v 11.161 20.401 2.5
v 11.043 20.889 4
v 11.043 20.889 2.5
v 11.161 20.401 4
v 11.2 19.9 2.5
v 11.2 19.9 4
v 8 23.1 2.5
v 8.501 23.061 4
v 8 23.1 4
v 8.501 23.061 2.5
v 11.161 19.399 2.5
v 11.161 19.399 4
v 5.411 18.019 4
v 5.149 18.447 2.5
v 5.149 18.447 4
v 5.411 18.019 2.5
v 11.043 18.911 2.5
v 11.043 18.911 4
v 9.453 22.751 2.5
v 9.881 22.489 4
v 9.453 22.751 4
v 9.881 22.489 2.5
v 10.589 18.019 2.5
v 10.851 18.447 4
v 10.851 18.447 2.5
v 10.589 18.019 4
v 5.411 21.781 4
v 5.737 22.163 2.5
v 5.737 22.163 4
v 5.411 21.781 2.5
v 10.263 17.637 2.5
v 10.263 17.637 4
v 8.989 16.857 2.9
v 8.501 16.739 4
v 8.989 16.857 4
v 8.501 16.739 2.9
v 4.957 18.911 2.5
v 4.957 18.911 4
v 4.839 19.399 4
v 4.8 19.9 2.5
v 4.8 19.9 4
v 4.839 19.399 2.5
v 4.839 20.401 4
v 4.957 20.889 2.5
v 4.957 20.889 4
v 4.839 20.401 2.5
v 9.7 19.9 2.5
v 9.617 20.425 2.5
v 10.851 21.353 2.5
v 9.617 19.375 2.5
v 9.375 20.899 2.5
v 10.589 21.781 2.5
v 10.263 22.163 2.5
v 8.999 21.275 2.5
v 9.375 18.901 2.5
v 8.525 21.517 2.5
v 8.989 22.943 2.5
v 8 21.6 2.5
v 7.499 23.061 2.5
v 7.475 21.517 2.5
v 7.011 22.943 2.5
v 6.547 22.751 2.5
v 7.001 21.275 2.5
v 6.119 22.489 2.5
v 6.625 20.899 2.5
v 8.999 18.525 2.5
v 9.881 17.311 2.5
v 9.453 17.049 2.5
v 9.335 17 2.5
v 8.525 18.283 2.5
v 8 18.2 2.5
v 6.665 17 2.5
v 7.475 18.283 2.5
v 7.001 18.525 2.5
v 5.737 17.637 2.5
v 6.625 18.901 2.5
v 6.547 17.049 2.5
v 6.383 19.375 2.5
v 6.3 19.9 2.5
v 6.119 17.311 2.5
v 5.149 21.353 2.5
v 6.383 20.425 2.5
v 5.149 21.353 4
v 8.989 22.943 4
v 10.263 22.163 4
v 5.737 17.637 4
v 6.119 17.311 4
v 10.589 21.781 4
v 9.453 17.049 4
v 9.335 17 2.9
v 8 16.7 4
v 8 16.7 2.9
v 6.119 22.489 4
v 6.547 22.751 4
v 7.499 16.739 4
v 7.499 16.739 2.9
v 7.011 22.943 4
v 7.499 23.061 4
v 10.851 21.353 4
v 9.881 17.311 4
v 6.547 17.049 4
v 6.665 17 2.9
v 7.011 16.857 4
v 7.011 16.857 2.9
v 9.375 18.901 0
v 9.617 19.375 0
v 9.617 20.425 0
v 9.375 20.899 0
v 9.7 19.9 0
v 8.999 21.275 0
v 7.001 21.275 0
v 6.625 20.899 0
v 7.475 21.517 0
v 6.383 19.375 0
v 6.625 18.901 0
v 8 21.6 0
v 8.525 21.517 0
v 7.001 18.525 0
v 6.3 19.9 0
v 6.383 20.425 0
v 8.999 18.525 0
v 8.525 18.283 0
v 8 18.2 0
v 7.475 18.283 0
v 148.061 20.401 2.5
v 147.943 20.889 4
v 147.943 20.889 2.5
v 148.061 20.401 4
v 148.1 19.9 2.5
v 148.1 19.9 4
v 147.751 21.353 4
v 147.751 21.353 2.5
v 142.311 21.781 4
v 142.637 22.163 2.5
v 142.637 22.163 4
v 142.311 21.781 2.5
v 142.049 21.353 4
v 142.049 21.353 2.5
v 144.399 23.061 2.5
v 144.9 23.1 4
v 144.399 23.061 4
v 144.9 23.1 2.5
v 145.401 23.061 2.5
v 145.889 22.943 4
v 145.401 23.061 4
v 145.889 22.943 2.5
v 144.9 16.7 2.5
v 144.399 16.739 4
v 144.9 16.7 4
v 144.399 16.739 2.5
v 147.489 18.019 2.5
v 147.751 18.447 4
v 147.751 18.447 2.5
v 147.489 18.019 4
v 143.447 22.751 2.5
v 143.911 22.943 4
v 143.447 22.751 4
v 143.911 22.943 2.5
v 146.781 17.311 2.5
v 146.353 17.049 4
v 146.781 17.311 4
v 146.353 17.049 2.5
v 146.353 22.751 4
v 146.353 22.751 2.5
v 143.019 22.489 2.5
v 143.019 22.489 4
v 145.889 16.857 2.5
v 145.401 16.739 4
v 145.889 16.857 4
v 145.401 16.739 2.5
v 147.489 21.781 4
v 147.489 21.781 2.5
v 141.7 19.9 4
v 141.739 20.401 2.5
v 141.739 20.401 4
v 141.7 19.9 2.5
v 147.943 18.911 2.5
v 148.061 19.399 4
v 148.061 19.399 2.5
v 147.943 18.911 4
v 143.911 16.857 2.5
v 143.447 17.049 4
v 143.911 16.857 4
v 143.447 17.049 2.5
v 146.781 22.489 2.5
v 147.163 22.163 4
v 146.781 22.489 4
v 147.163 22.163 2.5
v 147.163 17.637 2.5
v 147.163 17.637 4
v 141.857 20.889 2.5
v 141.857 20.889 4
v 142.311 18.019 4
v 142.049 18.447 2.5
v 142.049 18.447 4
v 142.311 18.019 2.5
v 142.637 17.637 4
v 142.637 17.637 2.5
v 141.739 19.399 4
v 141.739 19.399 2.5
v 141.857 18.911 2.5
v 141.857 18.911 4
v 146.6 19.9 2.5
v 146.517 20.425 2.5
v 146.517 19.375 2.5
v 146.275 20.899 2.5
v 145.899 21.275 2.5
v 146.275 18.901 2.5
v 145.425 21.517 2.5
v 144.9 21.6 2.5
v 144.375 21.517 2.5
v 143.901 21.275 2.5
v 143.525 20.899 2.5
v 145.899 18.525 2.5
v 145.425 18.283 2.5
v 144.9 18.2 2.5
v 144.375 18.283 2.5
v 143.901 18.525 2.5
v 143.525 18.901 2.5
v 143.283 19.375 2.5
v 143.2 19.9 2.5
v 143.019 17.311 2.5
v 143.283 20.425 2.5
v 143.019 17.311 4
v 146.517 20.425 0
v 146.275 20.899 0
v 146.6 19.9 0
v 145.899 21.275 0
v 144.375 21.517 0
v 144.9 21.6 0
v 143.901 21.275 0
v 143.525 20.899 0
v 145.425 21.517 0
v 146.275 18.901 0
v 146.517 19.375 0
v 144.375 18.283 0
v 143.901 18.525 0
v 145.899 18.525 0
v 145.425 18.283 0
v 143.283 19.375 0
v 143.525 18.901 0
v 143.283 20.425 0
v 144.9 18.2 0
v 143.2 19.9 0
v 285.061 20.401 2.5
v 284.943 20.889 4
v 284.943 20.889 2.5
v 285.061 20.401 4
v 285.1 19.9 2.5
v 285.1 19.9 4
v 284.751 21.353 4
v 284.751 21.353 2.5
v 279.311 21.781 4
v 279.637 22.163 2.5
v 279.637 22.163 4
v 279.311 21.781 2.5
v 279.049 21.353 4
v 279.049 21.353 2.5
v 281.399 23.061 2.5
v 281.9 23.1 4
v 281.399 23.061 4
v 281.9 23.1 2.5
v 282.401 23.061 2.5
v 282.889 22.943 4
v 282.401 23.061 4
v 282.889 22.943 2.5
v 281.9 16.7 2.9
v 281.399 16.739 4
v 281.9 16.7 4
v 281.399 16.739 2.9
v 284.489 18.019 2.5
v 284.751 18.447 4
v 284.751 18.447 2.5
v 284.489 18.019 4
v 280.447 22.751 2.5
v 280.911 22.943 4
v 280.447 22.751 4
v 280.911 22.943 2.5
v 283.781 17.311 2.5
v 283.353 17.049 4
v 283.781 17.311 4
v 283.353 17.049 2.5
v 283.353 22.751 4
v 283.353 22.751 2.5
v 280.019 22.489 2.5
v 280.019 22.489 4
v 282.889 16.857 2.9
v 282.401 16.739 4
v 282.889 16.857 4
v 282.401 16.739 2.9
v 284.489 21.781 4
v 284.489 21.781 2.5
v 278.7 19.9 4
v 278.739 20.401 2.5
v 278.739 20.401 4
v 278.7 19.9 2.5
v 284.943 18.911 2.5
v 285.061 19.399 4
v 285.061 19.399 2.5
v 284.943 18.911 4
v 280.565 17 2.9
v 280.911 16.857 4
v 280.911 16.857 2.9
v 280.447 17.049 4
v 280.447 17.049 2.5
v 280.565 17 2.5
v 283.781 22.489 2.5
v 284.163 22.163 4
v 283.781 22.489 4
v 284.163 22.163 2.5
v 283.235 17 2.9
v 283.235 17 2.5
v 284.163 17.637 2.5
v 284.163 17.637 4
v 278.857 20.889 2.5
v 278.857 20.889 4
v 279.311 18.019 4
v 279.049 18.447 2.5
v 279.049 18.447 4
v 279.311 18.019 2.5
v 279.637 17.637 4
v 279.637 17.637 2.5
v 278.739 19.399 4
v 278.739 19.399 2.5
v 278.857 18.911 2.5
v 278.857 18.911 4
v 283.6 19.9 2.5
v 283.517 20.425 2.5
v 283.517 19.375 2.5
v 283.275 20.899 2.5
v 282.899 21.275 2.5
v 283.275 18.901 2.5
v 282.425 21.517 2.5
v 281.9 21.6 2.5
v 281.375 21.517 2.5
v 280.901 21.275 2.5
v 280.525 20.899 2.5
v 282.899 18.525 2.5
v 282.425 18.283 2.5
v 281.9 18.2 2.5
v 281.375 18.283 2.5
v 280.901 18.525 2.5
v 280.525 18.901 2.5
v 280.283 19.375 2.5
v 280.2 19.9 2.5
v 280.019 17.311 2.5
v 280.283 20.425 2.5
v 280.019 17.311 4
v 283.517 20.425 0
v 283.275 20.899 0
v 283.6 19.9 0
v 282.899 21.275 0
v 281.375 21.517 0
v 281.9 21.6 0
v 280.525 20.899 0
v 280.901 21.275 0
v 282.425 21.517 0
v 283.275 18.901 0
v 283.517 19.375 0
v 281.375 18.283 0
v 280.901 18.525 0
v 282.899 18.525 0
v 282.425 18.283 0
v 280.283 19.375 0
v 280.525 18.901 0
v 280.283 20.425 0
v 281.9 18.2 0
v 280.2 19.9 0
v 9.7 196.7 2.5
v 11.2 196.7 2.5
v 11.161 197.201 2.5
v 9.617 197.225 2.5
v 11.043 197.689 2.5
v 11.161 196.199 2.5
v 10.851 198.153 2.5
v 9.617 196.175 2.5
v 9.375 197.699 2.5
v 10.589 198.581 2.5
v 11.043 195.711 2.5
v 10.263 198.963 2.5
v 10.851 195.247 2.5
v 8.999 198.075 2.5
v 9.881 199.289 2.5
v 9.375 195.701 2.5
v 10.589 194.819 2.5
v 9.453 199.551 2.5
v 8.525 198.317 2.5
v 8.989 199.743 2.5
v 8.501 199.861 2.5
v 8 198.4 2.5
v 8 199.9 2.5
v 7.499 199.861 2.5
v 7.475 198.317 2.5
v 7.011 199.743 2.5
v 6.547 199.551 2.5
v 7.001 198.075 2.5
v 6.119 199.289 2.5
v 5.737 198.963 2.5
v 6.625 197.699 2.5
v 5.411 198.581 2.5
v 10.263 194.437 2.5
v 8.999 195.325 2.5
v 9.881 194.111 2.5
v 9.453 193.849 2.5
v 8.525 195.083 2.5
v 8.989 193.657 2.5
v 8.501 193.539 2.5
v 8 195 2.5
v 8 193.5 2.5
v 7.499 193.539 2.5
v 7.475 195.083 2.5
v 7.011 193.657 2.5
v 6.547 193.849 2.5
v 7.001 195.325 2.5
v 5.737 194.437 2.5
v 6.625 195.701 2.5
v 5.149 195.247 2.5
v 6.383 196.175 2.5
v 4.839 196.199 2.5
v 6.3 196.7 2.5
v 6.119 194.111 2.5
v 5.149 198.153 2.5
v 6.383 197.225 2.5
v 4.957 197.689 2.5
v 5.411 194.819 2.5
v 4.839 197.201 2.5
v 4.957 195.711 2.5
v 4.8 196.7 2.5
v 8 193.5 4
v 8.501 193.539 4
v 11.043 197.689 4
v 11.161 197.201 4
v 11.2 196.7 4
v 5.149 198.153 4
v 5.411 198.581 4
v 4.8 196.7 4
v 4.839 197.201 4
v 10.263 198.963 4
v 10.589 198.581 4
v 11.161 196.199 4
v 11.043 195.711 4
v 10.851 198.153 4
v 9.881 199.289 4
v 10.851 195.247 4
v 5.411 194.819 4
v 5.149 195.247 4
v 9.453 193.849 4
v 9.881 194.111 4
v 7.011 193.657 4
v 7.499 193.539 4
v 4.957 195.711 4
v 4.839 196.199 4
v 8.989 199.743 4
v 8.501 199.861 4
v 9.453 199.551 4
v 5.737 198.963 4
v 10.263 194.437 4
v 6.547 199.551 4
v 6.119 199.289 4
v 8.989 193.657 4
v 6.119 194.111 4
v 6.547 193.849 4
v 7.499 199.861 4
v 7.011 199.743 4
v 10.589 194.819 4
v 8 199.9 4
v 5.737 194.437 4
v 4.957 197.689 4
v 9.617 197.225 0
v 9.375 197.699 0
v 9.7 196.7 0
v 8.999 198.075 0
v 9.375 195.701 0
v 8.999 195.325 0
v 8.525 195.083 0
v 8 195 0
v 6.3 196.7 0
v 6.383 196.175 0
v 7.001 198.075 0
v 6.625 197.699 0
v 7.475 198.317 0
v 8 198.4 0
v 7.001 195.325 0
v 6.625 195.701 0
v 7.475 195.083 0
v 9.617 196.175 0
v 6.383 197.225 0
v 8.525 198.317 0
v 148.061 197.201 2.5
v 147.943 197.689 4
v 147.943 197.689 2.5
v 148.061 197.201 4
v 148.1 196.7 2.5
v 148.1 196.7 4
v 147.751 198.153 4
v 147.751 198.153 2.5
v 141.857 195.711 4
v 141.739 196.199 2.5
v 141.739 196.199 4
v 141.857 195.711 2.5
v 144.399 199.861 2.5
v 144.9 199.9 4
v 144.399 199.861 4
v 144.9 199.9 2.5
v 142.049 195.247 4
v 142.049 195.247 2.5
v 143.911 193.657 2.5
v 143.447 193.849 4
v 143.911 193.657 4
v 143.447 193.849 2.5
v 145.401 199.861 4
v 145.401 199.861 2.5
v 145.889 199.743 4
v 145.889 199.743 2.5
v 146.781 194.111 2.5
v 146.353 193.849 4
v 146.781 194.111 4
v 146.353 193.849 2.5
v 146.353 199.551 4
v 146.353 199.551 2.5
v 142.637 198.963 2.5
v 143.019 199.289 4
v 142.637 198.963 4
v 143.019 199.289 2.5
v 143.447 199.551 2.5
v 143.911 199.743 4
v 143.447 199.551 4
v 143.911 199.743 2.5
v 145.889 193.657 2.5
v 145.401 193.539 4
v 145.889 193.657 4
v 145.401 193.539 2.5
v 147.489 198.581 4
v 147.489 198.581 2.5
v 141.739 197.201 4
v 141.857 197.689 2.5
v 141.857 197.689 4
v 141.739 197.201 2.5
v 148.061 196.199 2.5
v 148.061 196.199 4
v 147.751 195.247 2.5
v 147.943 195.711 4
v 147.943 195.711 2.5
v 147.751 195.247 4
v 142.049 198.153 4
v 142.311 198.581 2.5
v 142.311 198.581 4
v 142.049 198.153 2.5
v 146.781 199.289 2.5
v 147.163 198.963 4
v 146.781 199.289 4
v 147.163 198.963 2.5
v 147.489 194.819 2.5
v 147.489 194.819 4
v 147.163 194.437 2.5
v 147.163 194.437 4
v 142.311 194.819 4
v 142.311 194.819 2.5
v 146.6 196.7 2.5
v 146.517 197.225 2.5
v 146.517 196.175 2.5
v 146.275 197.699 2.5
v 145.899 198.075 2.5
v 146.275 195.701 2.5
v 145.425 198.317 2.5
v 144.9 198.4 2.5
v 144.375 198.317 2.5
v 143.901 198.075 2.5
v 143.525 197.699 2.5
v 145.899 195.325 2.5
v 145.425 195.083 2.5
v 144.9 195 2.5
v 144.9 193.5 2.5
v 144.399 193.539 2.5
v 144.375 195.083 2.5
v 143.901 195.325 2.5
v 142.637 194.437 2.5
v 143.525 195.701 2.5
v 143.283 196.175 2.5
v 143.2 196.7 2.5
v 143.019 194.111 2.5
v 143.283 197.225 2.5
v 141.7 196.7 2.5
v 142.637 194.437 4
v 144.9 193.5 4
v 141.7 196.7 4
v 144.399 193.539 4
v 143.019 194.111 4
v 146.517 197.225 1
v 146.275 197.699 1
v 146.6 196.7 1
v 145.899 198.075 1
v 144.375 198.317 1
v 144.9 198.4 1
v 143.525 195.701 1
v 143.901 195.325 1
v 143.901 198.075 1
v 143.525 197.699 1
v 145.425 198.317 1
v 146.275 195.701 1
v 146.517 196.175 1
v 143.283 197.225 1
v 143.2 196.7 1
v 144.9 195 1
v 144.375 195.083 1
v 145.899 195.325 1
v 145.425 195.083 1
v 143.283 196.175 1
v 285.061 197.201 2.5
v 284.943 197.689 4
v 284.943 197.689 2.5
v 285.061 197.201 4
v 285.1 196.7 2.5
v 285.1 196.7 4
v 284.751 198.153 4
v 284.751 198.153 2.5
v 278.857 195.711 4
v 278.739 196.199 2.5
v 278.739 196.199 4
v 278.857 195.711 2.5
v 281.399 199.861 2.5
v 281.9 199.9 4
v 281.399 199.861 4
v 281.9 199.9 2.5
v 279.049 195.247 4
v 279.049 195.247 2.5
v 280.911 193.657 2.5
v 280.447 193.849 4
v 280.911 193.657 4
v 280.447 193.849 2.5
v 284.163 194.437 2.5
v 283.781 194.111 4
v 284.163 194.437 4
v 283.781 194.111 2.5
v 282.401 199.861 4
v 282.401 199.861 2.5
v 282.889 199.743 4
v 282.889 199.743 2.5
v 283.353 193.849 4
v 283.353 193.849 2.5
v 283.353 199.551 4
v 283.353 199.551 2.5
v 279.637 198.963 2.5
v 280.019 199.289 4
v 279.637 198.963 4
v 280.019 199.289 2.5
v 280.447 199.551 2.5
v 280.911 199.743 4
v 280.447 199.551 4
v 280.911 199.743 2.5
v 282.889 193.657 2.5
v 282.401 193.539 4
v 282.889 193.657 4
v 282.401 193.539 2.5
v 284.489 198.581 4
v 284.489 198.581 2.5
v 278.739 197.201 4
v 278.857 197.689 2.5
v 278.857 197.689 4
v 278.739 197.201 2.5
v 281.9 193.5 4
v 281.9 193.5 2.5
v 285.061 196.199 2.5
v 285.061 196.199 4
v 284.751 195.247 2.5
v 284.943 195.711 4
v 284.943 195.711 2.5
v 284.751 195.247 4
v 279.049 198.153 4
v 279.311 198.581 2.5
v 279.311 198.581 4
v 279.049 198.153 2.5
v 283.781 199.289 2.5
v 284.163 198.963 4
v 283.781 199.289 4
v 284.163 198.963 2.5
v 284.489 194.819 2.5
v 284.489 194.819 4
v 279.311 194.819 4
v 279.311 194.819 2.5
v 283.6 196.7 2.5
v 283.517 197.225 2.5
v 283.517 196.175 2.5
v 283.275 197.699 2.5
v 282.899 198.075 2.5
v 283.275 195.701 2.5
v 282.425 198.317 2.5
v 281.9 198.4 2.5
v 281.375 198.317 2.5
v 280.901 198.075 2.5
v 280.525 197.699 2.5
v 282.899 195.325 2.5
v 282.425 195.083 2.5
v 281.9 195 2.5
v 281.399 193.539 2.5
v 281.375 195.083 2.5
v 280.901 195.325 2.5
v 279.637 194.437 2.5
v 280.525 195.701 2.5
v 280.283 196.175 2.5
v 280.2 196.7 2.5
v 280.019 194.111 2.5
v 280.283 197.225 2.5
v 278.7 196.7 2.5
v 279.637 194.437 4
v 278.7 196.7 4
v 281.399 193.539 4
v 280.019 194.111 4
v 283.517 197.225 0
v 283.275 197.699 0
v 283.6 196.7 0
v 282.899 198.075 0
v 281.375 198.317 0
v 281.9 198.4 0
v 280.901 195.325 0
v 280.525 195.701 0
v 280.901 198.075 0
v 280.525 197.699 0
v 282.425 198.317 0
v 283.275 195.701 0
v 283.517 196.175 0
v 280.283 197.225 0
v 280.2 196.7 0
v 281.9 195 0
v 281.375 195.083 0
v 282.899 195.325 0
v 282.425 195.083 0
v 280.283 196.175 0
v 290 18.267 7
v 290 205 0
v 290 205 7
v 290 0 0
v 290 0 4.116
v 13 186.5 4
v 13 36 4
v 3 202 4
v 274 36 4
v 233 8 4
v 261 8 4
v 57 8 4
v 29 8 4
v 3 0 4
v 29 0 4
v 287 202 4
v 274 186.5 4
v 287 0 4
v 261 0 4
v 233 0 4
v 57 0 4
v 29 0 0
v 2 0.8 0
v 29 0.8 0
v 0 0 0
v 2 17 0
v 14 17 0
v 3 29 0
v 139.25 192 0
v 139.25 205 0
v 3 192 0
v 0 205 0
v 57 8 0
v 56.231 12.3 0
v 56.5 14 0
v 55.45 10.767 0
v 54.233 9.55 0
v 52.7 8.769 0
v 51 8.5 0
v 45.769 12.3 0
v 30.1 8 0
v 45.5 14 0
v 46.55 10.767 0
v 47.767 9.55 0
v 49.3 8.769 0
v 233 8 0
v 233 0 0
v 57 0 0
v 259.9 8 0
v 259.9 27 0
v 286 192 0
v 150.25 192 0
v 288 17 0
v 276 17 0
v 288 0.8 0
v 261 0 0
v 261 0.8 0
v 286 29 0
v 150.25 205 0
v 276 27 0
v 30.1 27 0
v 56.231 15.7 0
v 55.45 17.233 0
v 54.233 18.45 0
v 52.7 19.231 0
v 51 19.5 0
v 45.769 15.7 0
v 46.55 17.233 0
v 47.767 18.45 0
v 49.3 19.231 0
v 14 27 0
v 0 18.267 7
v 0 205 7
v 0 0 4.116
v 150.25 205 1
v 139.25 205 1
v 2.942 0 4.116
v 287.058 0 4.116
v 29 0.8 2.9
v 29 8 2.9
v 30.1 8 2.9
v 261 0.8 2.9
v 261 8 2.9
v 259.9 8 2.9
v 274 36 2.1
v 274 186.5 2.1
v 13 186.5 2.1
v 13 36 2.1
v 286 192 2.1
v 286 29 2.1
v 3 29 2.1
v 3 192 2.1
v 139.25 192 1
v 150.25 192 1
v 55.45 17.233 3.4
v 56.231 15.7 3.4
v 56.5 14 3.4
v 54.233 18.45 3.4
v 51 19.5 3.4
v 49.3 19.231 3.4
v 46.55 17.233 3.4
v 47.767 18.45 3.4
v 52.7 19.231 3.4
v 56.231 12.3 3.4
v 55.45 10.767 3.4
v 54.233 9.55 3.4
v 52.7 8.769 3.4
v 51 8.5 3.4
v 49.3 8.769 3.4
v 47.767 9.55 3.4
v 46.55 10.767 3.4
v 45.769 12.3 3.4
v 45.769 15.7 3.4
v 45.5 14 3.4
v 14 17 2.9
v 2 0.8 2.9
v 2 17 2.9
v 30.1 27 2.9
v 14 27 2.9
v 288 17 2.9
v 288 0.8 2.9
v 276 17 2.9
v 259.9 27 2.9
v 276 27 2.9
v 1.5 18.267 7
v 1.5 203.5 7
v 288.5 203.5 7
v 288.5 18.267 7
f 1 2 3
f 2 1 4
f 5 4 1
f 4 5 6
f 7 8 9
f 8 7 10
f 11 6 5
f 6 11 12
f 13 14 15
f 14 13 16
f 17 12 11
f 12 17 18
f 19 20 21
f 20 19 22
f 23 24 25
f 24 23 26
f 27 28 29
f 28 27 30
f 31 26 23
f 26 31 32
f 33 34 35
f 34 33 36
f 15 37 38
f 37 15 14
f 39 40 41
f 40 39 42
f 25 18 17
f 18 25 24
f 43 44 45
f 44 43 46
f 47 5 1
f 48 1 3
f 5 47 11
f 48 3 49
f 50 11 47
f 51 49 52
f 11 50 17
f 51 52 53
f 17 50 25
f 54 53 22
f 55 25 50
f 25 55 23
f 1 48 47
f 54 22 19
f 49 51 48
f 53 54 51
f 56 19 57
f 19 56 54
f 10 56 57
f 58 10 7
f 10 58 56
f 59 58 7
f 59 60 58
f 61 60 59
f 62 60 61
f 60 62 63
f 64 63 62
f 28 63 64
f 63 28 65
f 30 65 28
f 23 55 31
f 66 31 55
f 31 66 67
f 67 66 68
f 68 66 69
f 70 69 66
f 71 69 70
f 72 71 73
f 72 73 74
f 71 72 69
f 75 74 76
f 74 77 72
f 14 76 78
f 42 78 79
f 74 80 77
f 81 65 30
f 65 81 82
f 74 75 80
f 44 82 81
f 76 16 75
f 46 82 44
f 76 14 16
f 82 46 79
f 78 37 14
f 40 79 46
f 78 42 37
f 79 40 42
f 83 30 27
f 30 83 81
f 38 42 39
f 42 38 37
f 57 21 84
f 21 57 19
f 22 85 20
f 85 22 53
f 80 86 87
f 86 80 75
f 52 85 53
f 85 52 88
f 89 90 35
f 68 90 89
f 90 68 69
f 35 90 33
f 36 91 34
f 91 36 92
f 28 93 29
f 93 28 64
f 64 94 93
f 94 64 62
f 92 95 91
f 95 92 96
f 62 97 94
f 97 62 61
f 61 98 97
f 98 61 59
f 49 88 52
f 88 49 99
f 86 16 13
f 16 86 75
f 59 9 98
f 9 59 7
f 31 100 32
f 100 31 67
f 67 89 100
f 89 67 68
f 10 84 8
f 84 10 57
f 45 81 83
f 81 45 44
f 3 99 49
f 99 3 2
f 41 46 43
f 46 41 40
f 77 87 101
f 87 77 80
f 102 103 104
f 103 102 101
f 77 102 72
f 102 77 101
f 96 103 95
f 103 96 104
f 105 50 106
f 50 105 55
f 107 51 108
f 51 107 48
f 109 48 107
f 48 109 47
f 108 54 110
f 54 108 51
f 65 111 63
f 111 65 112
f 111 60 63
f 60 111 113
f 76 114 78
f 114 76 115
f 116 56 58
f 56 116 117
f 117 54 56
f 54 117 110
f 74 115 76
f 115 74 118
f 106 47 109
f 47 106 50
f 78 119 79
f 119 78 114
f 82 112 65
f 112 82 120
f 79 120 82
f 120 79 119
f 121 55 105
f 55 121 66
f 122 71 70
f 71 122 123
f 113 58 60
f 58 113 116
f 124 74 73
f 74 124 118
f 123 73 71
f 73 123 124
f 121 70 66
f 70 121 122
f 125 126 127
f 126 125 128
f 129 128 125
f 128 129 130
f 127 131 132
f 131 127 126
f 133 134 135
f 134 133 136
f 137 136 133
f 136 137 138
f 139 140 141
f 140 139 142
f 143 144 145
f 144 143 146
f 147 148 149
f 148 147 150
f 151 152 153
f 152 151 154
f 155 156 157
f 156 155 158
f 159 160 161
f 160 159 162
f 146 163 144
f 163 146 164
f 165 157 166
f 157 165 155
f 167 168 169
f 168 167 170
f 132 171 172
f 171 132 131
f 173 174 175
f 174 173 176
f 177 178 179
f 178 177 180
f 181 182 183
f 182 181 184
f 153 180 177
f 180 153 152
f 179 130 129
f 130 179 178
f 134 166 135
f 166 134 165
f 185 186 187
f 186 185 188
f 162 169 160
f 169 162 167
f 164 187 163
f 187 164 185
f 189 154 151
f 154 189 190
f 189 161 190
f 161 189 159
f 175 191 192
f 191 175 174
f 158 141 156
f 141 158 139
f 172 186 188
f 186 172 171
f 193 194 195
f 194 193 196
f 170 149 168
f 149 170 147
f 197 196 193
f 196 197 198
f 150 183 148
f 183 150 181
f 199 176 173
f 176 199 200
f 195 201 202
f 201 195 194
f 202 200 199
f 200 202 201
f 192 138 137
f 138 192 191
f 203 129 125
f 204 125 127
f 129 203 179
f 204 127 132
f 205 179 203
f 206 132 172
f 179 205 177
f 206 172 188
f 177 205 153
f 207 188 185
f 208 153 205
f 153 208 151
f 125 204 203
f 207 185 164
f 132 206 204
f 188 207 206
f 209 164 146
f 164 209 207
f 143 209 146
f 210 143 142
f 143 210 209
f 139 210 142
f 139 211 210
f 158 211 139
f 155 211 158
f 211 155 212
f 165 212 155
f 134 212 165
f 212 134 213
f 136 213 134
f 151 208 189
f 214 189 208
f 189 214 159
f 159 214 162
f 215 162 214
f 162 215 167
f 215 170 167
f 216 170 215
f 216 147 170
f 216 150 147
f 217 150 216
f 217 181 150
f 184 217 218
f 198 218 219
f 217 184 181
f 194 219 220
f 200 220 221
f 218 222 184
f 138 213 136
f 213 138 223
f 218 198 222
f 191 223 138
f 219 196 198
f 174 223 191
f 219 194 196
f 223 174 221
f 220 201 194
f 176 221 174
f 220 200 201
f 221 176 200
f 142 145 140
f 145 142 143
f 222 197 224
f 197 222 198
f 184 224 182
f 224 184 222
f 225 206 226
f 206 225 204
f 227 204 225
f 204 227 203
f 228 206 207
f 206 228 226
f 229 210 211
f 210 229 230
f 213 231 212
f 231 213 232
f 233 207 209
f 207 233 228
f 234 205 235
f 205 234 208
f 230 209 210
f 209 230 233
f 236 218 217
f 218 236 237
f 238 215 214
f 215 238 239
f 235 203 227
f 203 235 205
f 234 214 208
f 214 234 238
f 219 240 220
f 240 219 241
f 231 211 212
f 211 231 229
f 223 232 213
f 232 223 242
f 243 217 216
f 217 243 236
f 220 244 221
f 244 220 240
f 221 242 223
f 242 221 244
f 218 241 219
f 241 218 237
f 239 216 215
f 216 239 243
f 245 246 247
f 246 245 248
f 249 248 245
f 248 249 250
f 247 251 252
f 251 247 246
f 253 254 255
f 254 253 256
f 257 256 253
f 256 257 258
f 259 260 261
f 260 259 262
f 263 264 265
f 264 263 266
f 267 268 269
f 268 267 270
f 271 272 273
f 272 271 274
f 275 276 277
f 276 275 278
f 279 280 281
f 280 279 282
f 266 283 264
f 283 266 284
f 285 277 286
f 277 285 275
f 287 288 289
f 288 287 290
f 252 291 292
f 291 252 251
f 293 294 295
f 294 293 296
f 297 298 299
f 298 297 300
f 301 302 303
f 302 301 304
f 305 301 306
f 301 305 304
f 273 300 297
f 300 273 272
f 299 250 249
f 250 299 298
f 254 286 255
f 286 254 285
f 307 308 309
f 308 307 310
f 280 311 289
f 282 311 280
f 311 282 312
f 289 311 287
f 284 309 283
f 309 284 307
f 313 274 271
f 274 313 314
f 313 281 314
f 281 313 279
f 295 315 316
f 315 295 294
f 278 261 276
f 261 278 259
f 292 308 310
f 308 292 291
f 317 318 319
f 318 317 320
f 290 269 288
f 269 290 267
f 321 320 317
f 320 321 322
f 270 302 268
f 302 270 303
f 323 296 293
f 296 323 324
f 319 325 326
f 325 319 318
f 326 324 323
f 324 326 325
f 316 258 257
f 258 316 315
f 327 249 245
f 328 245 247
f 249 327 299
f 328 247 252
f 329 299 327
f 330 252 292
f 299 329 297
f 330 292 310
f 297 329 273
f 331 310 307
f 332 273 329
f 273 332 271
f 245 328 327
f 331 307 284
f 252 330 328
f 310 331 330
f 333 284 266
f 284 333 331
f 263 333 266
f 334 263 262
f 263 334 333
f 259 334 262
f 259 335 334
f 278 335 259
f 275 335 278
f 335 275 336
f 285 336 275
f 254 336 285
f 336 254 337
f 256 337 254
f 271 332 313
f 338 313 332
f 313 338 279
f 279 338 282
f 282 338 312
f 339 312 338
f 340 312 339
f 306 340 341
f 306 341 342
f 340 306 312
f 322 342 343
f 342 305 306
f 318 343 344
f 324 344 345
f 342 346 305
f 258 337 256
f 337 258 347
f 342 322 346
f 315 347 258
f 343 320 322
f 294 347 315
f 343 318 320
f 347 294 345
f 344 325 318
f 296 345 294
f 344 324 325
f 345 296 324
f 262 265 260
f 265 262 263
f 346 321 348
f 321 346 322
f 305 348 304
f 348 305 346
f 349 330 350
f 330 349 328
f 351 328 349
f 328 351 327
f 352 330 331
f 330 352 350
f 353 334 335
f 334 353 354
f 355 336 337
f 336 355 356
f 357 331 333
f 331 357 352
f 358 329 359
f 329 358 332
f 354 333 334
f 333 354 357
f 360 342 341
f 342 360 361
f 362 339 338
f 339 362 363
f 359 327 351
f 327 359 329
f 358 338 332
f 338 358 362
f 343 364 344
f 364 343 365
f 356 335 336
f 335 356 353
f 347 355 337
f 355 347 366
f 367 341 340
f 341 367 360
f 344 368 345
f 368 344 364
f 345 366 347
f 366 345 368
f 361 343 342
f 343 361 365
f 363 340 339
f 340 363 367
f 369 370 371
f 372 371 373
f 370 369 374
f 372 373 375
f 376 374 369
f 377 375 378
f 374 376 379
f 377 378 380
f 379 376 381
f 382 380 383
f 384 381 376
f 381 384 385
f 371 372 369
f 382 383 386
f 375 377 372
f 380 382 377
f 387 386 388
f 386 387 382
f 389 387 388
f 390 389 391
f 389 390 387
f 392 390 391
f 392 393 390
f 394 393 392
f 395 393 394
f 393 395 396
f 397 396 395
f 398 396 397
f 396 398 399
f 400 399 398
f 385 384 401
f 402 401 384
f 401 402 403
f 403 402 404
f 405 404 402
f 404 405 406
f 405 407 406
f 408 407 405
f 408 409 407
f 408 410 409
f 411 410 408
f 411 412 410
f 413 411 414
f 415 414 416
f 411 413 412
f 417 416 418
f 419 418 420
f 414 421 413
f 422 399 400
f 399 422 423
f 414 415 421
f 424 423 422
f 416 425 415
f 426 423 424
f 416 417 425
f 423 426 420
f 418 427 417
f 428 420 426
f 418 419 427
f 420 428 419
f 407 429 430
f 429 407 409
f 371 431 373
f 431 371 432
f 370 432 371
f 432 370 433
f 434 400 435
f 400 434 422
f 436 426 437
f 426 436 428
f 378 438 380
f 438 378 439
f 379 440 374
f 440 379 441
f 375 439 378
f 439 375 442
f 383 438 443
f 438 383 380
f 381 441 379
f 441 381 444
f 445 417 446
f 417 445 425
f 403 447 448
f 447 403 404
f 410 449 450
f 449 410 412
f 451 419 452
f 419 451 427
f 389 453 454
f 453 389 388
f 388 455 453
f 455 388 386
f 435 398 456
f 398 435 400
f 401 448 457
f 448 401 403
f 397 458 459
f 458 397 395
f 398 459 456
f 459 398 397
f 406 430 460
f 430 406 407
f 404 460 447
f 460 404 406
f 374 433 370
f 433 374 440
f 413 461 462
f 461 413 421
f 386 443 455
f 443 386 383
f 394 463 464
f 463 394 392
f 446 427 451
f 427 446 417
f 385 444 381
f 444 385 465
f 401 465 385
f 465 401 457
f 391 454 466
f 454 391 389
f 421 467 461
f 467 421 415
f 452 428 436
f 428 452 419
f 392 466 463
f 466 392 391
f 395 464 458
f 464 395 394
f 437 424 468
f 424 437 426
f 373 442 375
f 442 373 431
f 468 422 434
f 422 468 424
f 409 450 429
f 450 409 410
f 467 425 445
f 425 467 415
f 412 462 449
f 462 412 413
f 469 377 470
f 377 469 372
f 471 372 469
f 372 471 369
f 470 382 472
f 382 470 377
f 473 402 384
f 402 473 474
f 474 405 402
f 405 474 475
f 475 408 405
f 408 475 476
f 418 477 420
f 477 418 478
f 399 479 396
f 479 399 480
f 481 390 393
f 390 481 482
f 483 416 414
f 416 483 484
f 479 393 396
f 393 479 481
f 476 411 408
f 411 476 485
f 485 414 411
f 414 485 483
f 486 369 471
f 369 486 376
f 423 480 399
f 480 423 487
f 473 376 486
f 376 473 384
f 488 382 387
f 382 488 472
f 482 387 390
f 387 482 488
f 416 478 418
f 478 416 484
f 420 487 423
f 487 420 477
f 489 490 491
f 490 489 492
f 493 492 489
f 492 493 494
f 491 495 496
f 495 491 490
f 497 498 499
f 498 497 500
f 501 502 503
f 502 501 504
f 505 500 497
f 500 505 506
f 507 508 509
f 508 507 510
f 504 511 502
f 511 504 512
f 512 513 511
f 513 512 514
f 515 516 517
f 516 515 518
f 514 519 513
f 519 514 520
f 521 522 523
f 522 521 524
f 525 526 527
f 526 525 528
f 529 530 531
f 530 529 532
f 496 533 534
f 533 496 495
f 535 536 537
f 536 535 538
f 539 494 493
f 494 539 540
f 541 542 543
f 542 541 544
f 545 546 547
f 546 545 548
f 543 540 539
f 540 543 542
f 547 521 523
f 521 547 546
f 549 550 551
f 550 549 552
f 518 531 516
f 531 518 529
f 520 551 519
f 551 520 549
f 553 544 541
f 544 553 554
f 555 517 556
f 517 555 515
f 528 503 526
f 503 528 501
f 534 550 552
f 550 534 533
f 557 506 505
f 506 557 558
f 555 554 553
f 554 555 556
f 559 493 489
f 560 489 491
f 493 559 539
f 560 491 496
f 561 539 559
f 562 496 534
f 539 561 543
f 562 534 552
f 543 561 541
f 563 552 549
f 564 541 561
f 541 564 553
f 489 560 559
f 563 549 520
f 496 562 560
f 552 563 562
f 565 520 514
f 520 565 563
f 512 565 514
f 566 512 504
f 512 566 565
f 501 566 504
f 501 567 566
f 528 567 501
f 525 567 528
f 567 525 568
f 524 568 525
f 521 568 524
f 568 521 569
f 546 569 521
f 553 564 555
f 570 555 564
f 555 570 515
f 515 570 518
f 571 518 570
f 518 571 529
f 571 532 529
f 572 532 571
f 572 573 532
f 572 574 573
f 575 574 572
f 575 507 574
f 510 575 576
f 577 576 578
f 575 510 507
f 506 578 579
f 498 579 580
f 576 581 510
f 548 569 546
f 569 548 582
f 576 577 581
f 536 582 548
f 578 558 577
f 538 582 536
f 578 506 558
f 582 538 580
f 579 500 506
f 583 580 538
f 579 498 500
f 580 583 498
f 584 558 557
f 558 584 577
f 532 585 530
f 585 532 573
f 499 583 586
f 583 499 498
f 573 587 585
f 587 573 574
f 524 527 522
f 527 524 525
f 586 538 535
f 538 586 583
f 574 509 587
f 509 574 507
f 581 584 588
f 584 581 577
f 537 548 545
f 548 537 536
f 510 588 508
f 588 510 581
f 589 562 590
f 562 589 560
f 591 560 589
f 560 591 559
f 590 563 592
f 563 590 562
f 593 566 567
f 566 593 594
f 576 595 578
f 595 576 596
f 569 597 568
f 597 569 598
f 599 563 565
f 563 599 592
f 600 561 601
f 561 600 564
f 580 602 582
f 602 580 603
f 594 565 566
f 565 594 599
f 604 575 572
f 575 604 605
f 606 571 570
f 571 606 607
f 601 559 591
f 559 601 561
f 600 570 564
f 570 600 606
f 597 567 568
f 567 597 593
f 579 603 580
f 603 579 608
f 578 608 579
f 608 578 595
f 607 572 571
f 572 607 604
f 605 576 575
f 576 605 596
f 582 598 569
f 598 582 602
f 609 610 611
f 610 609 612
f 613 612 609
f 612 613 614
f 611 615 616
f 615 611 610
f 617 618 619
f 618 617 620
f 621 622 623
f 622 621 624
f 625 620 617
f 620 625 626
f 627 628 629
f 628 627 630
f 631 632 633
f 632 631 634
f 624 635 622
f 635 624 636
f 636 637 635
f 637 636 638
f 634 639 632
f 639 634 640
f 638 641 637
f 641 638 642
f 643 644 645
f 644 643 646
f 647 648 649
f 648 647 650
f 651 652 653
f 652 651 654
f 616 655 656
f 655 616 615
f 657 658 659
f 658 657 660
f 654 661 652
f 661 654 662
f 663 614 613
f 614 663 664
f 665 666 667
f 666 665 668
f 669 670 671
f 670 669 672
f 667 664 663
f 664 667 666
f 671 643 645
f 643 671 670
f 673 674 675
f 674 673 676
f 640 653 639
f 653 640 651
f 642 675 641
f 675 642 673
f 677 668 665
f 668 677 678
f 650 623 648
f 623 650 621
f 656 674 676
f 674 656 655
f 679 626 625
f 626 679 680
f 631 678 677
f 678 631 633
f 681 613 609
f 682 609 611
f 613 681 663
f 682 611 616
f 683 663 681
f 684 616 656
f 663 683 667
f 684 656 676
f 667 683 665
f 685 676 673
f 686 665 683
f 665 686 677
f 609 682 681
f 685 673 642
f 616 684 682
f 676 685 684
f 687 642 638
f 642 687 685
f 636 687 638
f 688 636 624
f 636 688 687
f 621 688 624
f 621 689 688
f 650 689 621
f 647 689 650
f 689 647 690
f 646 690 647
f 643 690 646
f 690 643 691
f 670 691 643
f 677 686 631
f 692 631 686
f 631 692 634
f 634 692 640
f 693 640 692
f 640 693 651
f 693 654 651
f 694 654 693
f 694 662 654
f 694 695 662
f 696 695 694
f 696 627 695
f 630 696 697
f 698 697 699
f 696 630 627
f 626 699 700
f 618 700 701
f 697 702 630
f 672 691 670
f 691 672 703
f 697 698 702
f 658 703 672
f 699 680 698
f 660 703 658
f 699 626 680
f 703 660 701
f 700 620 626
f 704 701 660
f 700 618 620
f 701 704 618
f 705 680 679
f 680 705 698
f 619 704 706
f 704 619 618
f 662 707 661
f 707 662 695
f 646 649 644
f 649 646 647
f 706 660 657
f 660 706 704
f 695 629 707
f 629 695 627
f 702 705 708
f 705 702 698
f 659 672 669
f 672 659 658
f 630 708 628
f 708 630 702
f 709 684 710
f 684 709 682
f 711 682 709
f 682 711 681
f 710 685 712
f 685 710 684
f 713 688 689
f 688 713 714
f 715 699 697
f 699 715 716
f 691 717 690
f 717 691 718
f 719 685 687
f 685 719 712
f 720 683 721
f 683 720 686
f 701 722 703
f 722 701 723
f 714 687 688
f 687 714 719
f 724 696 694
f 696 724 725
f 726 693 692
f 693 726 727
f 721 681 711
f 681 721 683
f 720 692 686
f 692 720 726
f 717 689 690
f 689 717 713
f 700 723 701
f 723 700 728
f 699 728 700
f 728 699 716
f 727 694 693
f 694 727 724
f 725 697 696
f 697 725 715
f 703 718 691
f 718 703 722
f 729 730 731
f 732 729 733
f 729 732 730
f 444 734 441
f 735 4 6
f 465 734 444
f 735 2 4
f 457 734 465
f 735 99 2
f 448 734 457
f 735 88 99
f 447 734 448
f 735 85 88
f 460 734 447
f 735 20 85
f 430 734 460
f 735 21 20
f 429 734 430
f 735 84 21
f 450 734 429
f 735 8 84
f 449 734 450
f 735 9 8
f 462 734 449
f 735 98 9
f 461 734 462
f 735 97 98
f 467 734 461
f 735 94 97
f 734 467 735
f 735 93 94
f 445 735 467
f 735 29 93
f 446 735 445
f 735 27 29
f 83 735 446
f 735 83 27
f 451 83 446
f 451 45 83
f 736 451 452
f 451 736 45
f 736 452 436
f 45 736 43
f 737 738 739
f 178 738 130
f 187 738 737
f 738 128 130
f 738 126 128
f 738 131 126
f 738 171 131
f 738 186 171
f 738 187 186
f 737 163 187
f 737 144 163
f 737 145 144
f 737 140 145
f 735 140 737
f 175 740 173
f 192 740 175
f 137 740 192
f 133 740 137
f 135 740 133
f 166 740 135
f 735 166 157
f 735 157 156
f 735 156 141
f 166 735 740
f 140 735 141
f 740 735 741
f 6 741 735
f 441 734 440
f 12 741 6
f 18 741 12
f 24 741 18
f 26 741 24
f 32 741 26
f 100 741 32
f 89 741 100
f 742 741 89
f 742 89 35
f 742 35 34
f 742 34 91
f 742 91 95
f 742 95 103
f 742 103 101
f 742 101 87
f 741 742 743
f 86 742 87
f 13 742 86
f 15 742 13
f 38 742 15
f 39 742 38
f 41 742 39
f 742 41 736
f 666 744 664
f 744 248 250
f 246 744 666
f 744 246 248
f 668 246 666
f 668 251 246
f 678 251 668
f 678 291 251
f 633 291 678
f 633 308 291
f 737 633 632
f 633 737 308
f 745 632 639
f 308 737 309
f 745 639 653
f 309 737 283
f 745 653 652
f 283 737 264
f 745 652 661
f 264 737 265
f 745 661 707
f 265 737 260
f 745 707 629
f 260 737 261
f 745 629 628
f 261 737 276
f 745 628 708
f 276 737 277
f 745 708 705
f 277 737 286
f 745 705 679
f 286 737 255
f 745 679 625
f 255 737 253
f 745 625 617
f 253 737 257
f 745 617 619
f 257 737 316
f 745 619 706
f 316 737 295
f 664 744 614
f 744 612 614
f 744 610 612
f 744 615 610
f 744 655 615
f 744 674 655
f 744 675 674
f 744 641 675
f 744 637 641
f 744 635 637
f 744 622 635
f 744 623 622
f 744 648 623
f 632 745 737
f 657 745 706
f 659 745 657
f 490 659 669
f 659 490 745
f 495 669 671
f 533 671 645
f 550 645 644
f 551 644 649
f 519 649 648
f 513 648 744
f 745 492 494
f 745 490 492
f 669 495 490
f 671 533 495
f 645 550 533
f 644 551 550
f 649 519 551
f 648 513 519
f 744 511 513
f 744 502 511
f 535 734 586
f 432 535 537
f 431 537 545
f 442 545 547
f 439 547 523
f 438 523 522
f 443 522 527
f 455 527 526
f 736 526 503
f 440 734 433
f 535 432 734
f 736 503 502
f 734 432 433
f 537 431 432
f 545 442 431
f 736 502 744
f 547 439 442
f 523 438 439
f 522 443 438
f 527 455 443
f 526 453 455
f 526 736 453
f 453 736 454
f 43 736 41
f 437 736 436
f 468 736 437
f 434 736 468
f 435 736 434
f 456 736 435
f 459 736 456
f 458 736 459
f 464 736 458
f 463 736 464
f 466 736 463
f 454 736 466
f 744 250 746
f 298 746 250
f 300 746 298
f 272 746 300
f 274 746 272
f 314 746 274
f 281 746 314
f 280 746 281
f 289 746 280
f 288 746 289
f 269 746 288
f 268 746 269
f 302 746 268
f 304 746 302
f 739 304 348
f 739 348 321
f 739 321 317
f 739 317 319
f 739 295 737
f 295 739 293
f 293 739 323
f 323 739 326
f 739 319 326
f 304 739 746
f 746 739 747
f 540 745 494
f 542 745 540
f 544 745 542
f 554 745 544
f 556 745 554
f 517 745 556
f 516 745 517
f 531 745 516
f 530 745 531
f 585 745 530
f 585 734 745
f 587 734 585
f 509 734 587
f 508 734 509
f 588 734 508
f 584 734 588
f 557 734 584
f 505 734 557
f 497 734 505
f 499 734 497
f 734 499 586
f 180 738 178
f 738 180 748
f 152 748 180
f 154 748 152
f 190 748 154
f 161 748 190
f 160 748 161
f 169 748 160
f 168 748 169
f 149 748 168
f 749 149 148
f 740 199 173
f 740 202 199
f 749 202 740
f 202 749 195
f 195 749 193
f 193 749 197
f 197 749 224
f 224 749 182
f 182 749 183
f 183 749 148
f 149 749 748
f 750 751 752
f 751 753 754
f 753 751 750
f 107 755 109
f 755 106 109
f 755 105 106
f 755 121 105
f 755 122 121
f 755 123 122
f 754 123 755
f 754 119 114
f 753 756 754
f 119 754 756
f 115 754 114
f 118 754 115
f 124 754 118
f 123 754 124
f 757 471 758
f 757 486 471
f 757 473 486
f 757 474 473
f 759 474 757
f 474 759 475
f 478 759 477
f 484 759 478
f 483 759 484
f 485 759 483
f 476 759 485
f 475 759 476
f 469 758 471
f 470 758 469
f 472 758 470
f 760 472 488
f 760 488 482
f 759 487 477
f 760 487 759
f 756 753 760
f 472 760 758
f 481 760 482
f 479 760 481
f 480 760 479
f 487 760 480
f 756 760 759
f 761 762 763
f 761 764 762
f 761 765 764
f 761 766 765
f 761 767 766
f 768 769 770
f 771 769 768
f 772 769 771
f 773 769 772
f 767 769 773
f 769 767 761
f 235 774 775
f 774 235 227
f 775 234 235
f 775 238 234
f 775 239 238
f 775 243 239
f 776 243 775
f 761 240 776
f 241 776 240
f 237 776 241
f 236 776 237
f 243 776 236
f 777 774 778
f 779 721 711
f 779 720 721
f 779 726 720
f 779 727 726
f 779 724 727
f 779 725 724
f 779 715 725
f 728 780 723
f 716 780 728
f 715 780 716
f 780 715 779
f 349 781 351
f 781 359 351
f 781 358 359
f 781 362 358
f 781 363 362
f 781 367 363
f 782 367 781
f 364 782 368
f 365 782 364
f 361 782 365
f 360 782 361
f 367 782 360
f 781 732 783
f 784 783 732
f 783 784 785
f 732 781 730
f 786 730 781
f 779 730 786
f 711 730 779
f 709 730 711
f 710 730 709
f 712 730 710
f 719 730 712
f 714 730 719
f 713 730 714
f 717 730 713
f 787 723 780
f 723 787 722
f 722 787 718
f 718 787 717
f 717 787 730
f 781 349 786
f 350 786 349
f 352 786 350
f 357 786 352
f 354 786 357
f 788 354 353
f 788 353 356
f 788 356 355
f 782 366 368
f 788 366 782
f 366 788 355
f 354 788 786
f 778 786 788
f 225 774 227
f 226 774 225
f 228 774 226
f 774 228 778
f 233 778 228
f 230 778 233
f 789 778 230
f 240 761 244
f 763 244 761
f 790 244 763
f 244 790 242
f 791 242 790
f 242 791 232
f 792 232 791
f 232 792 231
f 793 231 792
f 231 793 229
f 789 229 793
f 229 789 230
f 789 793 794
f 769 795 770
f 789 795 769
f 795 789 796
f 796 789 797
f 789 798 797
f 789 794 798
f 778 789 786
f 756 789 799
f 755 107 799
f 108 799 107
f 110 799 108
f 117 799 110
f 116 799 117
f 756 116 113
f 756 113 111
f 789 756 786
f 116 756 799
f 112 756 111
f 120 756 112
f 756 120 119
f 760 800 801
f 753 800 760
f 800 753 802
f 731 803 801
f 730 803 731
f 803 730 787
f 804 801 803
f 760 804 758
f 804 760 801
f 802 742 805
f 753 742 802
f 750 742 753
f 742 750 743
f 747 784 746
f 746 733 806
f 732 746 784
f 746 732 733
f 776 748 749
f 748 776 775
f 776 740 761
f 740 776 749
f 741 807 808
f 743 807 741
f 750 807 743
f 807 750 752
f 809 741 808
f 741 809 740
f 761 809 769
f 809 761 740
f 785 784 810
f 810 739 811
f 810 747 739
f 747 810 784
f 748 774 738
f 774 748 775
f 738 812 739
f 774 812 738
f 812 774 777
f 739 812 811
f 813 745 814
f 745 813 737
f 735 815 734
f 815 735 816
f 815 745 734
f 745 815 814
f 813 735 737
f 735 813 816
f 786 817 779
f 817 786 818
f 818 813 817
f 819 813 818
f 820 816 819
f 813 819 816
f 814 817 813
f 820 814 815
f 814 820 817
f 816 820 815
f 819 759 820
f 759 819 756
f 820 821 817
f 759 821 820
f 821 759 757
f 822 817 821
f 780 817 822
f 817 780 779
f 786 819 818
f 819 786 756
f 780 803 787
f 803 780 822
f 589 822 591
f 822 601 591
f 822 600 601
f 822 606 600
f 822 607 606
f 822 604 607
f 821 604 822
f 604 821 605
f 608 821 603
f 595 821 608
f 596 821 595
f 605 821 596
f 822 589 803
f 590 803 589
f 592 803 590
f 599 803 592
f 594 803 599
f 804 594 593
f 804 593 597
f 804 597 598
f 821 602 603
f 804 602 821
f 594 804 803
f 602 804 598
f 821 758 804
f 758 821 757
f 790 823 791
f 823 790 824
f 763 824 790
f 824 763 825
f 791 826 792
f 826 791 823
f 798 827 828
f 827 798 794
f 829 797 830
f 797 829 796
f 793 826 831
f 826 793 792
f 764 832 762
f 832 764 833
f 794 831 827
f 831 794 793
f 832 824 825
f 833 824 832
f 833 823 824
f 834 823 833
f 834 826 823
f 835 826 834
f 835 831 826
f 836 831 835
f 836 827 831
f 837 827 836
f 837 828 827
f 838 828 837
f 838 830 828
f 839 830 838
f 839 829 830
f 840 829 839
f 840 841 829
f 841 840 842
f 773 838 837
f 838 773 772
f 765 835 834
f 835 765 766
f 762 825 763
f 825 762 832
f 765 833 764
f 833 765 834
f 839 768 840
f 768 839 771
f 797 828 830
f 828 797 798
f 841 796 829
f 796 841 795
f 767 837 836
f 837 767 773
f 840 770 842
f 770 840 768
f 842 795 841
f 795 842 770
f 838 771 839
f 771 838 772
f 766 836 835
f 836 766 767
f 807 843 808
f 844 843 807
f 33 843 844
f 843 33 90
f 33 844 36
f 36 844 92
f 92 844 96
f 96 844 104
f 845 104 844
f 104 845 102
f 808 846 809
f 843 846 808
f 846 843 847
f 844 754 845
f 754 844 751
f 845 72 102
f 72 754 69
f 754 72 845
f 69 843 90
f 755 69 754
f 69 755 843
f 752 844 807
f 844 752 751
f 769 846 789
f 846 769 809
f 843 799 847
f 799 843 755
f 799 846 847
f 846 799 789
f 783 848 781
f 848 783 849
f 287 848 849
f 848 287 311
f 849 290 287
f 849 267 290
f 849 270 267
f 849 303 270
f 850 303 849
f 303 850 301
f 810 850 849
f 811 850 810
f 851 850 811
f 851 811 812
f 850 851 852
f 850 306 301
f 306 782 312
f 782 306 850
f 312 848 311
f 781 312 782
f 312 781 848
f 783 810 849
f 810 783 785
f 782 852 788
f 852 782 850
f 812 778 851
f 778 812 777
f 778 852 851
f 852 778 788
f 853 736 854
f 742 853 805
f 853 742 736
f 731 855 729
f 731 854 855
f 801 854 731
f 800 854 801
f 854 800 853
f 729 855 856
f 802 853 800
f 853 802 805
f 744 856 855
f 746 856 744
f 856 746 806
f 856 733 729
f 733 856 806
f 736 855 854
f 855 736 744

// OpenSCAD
screws_ay=19.5;
screws_by=196.7;
frame_width=290;
frame_depth=205;
frame_height=4;
screw_head_h=1.5;
border_gap=0;
border_slope=19;
border_thickness=3;

module screw_hole(x,y) {
  shh=screw_head_h*2;
  translate([x,y,shh+1]) cylinder(h=shh, r=6.4/2, center = true, $fn=40);
  translate([x,y,0]) cylinder(h=frame_height*2, r=3.4/2, center = true, $fn=20);
}

module border(border_h,length) {
  rotate([90,0,0]) linear_extrude(height = length, center = true, convexity = 10) polygon(points=[[0,0],[border_h,0],[border_h/2,border_h],[0,border_h]]);

}

difference() {
  cube([frame_width,frame_depth,frame_height]);
  // hinge cutouts
  translate([29,-0.2,-0.1]) cube([28,8.2,4.2]);
  translate([frame_width-29-28,-0.2,-0.1]) cube([28,8.2,4.2]);
  
  // screen cutouts
  translate([13,36,-0.1]) cube([261,150.5,4.2]);
  translate([3,29,-0.1]) cube([283,163,2.2]);
  
  // screws bottom
  screw_hole(8,19.9);
  screw_hole(144.9,19.9);
  screw_hole(281.9,19.9);
  
  // screws top
  screw_hole(8,screws_by);
  screw_hole(144.9,screws_by);
  screw_hole(281.9,screws_by);

  // cutout for strap
  translate([139.25,188,-0.1]) cube([11,18,1.1]);
  
  // cutout for magnet
  translate([51,14,1.4]) cylinder(h=4, r=11/2, center = true, $fn=20);
  
  // hinge cutout back
  translate([2, 0.8,-0.1]) cube([28,  16.2,3]);
  translate([14,0.8,-0.1]) cube([16.1,26.2,3]);
  
  translate([frame_width-28-2,   0.8,-0.1]) cube([28,  16.2,3]);
  translate([frame_width-16.1-14,0.8,-0.1]) cube([16.1,26.2,3]);
}

// border
difference() {
  translate([0,frame_depth/2+border_gap/2,frame_height]) border(border_thickness,frame_depth-border_gap);

  translate([0,border_gap+border_slope-0.1,4+border_thickness+0.1]) rotate([270,0,270]) linear_extrude(height=10,center=true,convexity=10) polygon(points=[[0,0],[border_slope,0],[border_slope,border_thickness]]);
}
difference() {
  translate([frame_width,frame_depth/2+border_gap/2,frame_height]) rotate([0,0,180]) border(border_thickness,frame_depth-border_gap);
  
  translate([frame_width-2.5,border_gap+border_slope-0.1,4+border_thickness+0.1]) rotate([270,0,270]) linear_extrude(height=10,center=true,convexity=10) polygon(points=[[0,0],[border_slope,0],[border_slope,border_thickness]]);
}


translate([frame_width/2,frame_depth,frame_height]) rotate([0,0,270]) border(border_thickness,frame_width);
